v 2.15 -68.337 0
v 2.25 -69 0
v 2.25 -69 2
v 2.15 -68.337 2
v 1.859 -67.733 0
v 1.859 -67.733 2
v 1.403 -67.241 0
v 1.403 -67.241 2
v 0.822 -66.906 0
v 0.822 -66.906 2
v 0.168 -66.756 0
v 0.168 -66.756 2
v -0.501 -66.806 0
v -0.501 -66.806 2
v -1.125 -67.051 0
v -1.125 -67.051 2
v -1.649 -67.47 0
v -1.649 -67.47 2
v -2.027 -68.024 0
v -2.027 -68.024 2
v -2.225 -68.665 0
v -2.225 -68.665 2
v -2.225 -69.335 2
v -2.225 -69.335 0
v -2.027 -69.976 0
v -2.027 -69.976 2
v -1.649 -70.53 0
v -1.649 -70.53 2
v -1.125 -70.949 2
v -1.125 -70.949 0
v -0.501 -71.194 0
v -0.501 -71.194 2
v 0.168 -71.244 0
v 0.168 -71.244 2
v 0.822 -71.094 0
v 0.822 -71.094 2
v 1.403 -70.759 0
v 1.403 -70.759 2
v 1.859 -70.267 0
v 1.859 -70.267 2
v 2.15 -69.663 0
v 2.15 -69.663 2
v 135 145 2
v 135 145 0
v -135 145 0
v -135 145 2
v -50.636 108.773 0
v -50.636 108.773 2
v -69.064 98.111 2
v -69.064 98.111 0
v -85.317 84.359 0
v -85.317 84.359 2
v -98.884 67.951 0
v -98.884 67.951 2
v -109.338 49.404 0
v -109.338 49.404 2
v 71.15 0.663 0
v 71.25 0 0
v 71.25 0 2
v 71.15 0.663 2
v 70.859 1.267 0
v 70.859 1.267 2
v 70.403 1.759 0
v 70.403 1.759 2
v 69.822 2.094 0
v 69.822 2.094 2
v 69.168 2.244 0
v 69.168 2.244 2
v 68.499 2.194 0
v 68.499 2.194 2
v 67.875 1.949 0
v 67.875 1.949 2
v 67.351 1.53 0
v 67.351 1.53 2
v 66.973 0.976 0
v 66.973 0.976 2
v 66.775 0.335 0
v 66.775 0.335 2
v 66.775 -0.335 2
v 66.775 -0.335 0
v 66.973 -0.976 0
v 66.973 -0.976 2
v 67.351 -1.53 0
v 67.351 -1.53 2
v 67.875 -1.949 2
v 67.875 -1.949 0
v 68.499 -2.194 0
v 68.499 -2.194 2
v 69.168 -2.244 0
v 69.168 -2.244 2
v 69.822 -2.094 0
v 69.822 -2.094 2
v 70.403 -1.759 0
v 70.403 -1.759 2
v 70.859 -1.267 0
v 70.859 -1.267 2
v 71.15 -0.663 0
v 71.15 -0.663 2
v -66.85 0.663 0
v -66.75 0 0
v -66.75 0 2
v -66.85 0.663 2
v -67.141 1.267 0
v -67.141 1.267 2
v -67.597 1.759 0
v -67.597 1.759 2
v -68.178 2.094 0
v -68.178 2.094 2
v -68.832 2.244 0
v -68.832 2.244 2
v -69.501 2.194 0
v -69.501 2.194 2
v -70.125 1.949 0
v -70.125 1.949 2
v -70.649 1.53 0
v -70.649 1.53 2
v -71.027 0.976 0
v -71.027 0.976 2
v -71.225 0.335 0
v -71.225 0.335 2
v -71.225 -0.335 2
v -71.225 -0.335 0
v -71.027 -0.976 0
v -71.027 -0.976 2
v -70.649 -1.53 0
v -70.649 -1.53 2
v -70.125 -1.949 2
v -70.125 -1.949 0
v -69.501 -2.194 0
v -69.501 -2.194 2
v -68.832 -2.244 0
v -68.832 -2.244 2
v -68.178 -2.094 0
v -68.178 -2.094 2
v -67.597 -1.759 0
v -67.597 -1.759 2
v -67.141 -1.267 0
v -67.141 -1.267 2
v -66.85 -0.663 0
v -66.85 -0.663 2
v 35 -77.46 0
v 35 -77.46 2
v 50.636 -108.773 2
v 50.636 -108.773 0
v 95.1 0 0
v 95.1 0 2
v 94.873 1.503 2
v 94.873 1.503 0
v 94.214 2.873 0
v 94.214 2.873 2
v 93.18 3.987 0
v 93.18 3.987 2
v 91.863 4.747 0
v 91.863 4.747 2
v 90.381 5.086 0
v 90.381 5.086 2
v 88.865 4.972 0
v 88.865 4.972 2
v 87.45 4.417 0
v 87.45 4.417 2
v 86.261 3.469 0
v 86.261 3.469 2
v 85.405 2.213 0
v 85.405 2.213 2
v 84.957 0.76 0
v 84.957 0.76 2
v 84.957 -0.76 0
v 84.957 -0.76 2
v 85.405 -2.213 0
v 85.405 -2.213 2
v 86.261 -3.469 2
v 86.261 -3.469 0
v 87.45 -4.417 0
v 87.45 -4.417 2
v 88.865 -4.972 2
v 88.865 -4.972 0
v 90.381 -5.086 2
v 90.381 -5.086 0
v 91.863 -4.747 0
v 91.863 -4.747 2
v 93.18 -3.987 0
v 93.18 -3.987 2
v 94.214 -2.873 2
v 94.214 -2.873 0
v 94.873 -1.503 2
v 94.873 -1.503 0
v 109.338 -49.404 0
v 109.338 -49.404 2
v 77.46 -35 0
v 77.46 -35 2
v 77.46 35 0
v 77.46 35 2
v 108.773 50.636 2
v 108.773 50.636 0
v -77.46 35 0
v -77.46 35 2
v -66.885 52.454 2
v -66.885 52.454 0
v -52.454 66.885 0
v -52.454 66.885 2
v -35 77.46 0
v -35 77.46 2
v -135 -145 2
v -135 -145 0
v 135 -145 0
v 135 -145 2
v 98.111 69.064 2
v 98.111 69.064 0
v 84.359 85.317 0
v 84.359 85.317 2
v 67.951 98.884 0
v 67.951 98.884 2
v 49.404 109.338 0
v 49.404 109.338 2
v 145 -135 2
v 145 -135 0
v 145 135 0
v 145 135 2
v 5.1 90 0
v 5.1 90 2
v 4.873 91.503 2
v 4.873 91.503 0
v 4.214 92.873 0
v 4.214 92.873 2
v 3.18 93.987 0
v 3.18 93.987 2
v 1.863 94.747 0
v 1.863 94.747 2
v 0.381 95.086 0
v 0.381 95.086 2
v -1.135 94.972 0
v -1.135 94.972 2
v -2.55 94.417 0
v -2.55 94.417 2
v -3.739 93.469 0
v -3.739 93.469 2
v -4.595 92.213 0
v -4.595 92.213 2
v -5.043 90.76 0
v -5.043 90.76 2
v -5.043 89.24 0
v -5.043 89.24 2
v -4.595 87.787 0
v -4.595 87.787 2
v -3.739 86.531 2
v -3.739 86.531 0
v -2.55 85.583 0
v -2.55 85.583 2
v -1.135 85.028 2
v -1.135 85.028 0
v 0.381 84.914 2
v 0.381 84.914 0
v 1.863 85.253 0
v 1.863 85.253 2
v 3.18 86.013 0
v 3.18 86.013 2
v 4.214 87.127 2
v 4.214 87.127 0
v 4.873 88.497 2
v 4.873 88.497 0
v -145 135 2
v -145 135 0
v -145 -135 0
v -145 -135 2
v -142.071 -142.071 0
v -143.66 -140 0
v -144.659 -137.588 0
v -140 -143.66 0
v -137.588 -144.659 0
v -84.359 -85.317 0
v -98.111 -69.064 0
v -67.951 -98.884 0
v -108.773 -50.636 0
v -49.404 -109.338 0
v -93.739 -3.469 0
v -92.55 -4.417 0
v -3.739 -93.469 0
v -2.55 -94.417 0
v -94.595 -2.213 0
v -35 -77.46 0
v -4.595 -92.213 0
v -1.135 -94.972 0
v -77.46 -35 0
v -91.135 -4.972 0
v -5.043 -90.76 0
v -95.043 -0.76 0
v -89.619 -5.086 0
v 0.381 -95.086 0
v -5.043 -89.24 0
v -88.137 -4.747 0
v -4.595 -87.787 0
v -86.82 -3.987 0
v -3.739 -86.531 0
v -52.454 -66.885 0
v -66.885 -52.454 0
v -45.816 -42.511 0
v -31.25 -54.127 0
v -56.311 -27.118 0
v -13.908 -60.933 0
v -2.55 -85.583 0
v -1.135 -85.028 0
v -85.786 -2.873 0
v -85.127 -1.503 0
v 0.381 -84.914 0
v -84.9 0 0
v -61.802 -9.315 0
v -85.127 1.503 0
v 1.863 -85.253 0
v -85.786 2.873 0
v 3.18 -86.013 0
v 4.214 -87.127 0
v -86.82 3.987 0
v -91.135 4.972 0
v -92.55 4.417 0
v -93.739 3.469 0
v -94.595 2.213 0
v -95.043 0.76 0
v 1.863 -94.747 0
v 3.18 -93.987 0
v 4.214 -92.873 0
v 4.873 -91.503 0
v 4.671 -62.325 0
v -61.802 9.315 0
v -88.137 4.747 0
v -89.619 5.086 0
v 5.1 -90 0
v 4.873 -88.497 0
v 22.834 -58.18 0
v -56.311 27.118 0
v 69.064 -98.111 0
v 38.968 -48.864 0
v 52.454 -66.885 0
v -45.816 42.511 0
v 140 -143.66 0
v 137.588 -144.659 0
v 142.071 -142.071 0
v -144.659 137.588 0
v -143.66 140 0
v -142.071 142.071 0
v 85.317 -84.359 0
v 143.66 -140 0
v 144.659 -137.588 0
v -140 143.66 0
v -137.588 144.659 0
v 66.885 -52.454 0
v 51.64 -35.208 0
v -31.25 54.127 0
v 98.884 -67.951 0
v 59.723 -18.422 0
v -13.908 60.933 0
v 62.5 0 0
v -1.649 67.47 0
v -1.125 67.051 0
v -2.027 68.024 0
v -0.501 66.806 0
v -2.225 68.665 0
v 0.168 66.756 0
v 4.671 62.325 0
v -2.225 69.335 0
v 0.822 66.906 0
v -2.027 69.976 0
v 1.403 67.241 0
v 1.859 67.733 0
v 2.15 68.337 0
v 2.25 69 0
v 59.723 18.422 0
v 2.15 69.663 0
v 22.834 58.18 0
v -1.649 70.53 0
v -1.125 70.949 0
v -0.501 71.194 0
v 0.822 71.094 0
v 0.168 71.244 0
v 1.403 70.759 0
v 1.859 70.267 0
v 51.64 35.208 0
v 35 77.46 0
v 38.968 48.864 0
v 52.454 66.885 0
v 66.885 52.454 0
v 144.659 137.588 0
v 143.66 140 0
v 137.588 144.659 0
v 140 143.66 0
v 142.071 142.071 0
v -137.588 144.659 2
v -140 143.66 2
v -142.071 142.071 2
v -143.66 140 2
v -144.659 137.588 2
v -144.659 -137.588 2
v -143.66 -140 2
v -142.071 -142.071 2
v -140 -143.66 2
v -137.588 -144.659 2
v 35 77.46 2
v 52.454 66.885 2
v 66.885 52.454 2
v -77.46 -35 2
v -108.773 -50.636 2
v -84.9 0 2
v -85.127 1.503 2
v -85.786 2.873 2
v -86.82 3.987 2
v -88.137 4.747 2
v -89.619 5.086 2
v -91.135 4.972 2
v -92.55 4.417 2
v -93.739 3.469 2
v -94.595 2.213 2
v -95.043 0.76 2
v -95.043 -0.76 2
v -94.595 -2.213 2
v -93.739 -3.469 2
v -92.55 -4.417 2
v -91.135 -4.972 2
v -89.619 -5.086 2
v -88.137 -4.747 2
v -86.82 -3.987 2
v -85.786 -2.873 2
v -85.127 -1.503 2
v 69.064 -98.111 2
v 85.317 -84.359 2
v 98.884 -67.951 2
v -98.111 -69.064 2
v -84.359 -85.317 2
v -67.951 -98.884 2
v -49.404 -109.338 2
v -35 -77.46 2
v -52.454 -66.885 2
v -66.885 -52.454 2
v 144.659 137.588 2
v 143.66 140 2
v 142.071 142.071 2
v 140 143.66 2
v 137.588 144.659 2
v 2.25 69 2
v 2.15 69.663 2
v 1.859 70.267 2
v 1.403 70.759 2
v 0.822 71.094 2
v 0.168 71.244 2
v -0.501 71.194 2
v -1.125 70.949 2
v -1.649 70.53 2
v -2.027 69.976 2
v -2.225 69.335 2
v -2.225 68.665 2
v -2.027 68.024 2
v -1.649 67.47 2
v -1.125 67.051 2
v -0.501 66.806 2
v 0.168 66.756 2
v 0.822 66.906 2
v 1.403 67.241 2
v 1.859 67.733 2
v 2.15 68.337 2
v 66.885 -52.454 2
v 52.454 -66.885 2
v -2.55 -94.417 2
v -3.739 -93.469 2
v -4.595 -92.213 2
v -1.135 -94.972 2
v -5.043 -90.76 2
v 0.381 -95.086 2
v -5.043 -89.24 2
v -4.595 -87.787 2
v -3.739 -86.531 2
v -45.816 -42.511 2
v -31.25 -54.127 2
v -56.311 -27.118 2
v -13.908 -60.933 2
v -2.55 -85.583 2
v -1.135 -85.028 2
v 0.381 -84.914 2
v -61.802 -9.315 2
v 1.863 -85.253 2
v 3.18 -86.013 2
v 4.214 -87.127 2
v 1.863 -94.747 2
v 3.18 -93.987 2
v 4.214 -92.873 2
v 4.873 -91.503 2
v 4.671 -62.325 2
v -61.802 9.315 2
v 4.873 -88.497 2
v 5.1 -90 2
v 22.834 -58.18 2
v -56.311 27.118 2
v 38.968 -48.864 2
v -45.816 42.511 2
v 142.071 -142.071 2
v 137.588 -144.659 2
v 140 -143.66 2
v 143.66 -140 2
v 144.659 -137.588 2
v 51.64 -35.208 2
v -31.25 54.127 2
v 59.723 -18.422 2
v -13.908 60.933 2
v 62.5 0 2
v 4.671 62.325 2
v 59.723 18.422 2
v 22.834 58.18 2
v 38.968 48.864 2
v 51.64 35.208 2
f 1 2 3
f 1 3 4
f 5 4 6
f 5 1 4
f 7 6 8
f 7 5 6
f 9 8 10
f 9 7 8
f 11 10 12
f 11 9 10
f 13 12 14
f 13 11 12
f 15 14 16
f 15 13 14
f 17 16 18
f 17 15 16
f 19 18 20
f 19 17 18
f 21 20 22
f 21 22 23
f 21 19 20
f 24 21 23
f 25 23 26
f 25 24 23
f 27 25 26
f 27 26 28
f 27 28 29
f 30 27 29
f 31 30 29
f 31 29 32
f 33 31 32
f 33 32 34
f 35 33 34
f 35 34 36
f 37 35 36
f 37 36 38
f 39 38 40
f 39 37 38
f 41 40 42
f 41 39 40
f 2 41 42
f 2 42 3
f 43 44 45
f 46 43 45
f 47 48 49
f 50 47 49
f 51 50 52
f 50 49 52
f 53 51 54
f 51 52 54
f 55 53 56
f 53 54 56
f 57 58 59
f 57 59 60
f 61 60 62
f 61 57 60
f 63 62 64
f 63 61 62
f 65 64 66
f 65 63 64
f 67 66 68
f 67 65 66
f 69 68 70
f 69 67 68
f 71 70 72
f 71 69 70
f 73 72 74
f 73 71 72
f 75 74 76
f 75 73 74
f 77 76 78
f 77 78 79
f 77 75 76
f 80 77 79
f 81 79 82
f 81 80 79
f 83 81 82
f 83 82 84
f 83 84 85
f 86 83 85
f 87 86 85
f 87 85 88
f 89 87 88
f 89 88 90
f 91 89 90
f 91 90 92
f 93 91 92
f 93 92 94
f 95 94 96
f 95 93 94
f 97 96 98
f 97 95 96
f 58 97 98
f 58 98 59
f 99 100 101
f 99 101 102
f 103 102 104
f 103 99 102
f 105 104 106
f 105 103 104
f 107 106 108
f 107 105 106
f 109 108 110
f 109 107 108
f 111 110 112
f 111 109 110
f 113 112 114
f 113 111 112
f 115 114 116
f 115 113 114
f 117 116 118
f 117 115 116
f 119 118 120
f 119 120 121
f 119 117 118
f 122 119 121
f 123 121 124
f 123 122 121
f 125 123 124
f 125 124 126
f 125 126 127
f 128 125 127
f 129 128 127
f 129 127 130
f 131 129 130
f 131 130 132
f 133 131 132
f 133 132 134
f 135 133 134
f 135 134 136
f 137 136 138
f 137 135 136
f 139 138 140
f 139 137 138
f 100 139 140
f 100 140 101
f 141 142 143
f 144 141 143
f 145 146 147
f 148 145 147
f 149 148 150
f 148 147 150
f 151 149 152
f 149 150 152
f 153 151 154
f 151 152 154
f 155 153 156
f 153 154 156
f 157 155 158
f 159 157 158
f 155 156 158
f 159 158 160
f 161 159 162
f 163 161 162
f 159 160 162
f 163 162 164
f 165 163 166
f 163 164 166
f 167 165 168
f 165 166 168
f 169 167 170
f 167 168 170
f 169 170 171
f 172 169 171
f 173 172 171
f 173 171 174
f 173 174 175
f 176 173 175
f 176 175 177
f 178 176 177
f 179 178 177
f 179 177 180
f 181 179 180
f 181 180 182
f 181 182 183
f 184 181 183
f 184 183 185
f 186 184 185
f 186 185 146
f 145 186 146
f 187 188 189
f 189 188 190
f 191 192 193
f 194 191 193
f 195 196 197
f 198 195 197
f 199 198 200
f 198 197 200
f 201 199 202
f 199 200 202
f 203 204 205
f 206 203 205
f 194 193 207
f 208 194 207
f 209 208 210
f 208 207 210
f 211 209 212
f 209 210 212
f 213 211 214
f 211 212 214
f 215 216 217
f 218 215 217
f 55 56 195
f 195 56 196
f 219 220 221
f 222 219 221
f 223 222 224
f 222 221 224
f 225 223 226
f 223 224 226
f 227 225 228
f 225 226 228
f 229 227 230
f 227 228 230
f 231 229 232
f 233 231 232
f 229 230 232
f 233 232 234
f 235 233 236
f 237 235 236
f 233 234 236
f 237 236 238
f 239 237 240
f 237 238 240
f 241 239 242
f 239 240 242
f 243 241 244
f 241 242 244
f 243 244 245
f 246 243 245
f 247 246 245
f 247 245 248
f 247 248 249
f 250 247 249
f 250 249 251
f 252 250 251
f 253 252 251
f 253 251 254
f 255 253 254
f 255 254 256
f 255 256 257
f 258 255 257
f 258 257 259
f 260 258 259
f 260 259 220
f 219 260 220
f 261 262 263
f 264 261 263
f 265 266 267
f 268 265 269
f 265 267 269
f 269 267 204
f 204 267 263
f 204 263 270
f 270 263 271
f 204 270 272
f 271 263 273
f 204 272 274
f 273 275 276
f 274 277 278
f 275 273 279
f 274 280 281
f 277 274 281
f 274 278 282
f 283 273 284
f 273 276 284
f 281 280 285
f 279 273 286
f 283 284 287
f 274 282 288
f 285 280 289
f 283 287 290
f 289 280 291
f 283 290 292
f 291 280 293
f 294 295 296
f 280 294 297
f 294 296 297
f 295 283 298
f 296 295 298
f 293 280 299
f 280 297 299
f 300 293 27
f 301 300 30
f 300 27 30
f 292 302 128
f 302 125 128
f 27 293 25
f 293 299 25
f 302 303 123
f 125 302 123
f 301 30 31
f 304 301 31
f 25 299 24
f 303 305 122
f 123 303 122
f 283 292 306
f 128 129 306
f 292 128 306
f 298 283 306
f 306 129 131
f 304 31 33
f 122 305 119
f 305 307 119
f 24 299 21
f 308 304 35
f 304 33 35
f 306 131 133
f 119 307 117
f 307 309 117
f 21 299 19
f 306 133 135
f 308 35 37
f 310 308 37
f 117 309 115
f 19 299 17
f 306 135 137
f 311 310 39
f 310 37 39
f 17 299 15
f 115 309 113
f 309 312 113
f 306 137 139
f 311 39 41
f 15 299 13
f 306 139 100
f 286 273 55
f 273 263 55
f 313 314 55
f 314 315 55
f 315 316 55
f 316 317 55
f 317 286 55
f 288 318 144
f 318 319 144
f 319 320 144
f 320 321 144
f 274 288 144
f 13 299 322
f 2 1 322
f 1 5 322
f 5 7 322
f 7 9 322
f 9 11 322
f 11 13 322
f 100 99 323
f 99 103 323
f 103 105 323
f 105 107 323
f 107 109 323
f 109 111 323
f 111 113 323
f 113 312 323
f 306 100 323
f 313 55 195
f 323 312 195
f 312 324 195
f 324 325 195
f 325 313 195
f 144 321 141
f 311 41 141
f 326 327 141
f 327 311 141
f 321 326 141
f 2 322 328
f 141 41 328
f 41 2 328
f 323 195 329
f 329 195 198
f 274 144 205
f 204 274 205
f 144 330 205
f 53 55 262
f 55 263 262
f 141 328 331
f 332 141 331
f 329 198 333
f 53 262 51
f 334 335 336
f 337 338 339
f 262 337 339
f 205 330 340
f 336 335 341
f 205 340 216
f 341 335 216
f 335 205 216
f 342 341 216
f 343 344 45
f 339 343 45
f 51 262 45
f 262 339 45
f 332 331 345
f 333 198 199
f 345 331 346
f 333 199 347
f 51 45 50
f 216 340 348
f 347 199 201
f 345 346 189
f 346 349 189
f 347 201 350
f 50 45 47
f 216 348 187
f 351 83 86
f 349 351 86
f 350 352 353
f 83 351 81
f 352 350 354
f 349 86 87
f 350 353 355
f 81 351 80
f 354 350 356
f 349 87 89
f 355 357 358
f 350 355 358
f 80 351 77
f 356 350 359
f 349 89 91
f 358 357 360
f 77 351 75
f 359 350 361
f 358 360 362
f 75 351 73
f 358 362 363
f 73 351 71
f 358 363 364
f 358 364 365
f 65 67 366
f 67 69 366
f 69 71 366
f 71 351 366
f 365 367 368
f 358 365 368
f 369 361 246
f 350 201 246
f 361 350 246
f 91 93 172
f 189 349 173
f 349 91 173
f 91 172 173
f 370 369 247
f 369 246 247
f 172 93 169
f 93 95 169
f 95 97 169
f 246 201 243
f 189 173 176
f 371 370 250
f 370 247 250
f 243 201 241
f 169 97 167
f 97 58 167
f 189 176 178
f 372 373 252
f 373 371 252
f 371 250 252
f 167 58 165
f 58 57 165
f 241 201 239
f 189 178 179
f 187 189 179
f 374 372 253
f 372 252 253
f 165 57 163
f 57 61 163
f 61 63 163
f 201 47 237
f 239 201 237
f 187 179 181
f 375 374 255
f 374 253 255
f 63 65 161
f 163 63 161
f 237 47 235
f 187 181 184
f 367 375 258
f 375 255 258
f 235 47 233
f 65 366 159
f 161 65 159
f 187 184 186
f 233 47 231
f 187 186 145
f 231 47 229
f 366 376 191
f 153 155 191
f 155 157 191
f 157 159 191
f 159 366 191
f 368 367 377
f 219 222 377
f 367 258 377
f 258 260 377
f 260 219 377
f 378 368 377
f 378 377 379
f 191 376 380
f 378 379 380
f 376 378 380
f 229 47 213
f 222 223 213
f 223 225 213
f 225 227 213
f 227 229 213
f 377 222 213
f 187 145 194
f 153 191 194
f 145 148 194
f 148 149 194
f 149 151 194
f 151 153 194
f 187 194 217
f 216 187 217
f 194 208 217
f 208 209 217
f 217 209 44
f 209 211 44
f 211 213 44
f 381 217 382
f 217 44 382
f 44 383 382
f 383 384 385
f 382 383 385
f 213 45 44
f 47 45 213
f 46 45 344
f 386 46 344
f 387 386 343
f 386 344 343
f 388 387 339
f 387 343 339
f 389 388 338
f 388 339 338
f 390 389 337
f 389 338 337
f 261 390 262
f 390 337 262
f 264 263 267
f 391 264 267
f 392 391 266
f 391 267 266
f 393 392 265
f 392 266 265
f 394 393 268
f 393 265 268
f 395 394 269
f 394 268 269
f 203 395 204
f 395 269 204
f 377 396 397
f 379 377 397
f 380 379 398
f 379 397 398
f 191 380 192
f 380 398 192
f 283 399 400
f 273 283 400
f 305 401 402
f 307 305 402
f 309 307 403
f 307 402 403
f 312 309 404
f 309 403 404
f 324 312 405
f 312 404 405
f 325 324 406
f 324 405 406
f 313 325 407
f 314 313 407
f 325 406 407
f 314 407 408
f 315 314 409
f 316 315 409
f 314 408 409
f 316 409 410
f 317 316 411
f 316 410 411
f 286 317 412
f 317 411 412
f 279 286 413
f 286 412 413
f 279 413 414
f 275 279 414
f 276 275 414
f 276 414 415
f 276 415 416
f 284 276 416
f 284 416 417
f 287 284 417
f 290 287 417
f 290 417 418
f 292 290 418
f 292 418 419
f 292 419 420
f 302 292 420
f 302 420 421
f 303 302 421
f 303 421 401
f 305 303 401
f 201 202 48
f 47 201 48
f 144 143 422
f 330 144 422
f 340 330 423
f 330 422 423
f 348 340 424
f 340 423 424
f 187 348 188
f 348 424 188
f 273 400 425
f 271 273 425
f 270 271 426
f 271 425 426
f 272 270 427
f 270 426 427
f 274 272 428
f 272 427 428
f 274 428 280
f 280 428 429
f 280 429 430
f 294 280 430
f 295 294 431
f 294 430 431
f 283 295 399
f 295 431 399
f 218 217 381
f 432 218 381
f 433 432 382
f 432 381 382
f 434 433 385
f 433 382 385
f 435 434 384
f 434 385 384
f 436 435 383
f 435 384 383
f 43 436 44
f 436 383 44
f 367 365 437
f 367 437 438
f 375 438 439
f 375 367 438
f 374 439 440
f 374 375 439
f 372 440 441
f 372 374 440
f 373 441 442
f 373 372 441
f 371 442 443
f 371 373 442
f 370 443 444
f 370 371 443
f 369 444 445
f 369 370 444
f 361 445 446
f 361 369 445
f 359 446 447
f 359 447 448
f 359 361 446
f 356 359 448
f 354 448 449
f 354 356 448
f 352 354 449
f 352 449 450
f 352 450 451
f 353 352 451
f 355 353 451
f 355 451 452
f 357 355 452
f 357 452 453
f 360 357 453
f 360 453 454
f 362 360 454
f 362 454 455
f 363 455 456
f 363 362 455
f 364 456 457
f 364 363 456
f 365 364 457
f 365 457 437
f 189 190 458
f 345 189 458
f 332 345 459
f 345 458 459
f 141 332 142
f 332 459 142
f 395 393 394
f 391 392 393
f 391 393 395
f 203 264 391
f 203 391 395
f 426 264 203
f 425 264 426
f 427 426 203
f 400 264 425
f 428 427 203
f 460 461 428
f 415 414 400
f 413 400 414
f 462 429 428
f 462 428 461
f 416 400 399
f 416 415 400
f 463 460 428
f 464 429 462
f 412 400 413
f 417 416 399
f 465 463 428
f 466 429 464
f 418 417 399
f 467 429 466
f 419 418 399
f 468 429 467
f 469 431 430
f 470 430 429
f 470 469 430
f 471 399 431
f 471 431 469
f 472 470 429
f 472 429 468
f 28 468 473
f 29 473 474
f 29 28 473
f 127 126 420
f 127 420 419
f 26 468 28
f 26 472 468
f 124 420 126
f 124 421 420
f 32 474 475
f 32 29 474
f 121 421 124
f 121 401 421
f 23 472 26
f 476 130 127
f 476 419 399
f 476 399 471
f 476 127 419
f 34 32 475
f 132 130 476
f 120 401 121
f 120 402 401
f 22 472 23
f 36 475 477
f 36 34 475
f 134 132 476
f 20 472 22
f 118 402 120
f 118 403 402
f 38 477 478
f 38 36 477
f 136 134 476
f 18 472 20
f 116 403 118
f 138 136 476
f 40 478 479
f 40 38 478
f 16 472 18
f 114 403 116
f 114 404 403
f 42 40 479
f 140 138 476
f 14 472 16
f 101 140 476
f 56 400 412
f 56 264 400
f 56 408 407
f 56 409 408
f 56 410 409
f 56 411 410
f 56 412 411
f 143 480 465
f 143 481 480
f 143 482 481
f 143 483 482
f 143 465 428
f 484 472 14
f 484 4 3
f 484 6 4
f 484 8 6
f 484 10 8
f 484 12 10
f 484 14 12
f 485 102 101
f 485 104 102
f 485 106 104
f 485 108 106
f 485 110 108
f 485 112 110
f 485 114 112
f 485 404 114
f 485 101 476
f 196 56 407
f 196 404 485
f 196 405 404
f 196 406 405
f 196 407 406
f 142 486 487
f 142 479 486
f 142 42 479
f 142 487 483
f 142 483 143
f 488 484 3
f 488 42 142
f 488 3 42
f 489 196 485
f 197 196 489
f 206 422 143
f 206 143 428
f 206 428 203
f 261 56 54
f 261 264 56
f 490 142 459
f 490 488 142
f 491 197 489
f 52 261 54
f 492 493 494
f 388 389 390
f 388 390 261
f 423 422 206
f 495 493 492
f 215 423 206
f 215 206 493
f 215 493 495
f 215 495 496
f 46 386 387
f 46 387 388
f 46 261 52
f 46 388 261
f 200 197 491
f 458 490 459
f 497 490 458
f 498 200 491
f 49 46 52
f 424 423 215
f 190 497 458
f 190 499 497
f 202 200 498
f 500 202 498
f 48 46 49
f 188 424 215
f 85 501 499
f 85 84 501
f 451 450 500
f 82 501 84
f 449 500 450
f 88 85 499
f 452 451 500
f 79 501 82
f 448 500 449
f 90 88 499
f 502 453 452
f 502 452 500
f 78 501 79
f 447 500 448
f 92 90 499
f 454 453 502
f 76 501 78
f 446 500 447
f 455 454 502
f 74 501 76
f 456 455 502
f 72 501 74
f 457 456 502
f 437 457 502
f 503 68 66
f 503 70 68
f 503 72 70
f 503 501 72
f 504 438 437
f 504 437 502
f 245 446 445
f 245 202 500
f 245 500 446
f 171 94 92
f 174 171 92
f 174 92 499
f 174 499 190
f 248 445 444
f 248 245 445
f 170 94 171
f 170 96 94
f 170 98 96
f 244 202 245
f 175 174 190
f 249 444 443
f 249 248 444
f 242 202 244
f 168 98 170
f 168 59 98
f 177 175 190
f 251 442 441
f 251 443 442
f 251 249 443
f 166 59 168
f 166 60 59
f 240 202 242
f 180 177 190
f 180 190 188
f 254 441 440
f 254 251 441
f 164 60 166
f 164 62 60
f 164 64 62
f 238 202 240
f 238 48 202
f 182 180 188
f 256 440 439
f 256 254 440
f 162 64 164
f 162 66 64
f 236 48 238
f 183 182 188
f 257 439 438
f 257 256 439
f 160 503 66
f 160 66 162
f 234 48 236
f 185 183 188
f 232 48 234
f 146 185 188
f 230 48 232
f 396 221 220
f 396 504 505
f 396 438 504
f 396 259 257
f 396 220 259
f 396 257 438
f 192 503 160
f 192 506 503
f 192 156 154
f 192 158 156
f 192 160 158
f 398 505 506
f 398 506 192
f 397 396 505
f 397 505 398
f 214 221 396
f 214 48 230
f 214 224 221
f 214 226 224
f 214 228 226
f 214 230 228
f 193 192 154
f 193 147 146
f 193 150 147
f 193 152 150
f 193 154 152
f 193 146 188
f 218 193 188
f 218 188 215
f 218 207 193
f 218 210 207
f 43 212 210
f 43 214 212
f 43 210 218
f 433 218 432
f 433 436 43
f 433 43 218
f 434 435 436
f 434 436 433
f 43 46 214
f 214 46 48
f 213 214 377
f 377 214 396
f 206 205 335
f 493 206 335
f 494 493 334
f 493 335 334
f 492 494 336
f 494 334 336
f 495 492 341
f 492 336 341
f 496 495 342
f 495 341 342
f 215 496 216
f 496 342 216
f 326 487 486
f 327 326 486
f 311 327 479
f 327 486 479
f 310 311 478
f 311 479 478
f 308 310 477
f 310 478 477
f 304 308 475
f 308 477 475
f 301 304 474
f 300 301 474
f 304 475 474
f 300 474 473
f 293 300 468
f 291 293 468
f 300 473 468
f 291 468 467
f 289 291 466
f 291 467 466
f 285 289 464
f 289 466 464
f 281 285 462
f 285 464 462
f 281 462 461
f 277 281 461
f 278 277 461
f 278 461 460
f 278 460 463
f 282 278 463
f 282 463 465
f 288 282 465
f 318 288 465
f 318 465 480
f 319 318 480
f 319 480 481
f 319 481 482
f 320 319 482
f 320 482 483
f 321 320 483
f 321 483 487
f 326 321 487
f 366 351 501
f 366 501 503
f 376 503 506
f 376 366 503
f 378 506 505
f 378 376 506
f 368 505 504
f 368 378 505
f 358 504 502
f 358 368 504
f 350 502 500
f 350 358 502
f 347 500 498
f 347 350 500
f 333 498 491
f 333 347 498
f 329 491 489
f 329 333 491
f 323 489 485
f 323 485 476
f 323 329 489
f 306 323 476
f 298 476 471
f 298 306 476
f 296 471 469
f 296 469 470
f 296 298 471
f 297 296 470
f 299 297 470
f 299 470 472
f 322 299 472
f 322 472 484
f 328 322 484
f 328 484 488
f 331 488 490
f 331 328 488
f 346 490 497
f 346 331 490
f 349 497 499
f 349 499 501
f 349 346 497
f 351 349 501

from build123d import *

# Parameters (mm, degrees)
F0_R     = 2.25
F0_R_2   = 62.5
F1_DEPTH = 2
F2_R     = 5.1
F3_DEPTH = 25
F5_DEPTH = 25


with BuildPart() as f1:
    # F0 (on Top) → F1 (new body)
    with BuildSketch(Plane.XY):
        with BuildLine():
            Line((135, 145), (-135, 145))
            ThreePointArc((-135, 145), (-142.071068, 142.071068), (-145, 135))
            Line((-145, 135), (-145, -135))
            ThreePointArc((-145, -135), (-142.071068, -142.071068), (-135, -145))
            Line((-135, -145), (135, -145))
            ThreePointArc((135, -145), (142.071068, -142.071068), (145, -135))
            Line((145, -135), (145, 135))
            ThreePointArc((145, 135), (142.071068, 142.071068), (135, 145))
        make_face()
        with Locations((0, -69)):
            Circle(F0_R, mode=Mode.SUBTRACT)
        with Locations((-69, 0)):
            Circle(F0_R, mode=Mode.SUBTRACT)
        Circle(F0_R_2, mode=Mode.SUBTRACT)
        with Locations((69, 0)):
            Circle(F0_R, mode=Mode.SUBTRACT)
        with Locations((0, 69)):
            Circle(F0_R, mode=Mode.SUBTRACT)
    extrude(amount=F1_DEPTH)

    # F2 (on face) → F3 (cut)
    with BuildSketch(Plane.XY.offset(2)):
        with Locations((0, 90)):
            Circle(F2_R)
        with Locations((-90, 0)):
            Circle(F2_R)
        with Locations((0, -90)):
            Circle(F2_R)
        with Locations((90, 0)):
            Circle(F2_R)
    extrude(amount=-F3_DEPTH, mode=Mode.SUBTRACT)

    # F4 (on face) → F5 (cut)
    with BuildSketch(Plane.XY.offset(2)):
        with BuildLine():
            Line((-35, 77.459667), (-50.635936, 108.772883))
            ThreePointArc((-50.635936, 108.772883), (-85.317456, 84.359171), (-109.337881, 49.404109))
            Line((-109.337881, 49.404109), (-77.459667, 35))
            ThreePointArc((-77.459667, 35), (-60.104076, 60.104076), (-35, 77.459667))
        make_face()
        with BuildLine():
            Line((77.459667, 35), (108.772883, 50.635936))
            ThreePointArc((108.772883, 50.635936), (84.359171, 85.317456), (49.404109, 109.337881))
            Line((49.404109, 109.337881), (35, 77.459667))
            ThreePointArc((35, 77.459667), (60.104076, 60.104076), (77.459667, 35))
        make_face()
        with BuildLine():
            ThreePointArc((50.635936, -108.772883), (85.317456, -84.359171), (109.337881, -49.404109))
            Line((109.337881, -49.404109), (77.459667, -35))
            ThreePointArc((77.459667, -35), (60.104076, -60.104076), (35, -77.459667))
            Line((35, -77.459667), (50.635936, -108.772883))
        make_face()
        with BuildLine():
            ThreePointArc((-108.772883, -50.635936), (-84.359171, -85.317456), (-49.404109, -109.337881))
            Line((-49.404109, -109.337881), (-35, -77.459667))
            ThreePointArc((-35, -77.459667), (-60.104076, -60.104076), (-77.459667, -35))
            Line((-77.459667, -35), (-108.772883, -50.635936))
        make_face()
    extrude(amount=-F5_DEPTH, mode=Mode.SUBTRACT)


solid = f1.part
